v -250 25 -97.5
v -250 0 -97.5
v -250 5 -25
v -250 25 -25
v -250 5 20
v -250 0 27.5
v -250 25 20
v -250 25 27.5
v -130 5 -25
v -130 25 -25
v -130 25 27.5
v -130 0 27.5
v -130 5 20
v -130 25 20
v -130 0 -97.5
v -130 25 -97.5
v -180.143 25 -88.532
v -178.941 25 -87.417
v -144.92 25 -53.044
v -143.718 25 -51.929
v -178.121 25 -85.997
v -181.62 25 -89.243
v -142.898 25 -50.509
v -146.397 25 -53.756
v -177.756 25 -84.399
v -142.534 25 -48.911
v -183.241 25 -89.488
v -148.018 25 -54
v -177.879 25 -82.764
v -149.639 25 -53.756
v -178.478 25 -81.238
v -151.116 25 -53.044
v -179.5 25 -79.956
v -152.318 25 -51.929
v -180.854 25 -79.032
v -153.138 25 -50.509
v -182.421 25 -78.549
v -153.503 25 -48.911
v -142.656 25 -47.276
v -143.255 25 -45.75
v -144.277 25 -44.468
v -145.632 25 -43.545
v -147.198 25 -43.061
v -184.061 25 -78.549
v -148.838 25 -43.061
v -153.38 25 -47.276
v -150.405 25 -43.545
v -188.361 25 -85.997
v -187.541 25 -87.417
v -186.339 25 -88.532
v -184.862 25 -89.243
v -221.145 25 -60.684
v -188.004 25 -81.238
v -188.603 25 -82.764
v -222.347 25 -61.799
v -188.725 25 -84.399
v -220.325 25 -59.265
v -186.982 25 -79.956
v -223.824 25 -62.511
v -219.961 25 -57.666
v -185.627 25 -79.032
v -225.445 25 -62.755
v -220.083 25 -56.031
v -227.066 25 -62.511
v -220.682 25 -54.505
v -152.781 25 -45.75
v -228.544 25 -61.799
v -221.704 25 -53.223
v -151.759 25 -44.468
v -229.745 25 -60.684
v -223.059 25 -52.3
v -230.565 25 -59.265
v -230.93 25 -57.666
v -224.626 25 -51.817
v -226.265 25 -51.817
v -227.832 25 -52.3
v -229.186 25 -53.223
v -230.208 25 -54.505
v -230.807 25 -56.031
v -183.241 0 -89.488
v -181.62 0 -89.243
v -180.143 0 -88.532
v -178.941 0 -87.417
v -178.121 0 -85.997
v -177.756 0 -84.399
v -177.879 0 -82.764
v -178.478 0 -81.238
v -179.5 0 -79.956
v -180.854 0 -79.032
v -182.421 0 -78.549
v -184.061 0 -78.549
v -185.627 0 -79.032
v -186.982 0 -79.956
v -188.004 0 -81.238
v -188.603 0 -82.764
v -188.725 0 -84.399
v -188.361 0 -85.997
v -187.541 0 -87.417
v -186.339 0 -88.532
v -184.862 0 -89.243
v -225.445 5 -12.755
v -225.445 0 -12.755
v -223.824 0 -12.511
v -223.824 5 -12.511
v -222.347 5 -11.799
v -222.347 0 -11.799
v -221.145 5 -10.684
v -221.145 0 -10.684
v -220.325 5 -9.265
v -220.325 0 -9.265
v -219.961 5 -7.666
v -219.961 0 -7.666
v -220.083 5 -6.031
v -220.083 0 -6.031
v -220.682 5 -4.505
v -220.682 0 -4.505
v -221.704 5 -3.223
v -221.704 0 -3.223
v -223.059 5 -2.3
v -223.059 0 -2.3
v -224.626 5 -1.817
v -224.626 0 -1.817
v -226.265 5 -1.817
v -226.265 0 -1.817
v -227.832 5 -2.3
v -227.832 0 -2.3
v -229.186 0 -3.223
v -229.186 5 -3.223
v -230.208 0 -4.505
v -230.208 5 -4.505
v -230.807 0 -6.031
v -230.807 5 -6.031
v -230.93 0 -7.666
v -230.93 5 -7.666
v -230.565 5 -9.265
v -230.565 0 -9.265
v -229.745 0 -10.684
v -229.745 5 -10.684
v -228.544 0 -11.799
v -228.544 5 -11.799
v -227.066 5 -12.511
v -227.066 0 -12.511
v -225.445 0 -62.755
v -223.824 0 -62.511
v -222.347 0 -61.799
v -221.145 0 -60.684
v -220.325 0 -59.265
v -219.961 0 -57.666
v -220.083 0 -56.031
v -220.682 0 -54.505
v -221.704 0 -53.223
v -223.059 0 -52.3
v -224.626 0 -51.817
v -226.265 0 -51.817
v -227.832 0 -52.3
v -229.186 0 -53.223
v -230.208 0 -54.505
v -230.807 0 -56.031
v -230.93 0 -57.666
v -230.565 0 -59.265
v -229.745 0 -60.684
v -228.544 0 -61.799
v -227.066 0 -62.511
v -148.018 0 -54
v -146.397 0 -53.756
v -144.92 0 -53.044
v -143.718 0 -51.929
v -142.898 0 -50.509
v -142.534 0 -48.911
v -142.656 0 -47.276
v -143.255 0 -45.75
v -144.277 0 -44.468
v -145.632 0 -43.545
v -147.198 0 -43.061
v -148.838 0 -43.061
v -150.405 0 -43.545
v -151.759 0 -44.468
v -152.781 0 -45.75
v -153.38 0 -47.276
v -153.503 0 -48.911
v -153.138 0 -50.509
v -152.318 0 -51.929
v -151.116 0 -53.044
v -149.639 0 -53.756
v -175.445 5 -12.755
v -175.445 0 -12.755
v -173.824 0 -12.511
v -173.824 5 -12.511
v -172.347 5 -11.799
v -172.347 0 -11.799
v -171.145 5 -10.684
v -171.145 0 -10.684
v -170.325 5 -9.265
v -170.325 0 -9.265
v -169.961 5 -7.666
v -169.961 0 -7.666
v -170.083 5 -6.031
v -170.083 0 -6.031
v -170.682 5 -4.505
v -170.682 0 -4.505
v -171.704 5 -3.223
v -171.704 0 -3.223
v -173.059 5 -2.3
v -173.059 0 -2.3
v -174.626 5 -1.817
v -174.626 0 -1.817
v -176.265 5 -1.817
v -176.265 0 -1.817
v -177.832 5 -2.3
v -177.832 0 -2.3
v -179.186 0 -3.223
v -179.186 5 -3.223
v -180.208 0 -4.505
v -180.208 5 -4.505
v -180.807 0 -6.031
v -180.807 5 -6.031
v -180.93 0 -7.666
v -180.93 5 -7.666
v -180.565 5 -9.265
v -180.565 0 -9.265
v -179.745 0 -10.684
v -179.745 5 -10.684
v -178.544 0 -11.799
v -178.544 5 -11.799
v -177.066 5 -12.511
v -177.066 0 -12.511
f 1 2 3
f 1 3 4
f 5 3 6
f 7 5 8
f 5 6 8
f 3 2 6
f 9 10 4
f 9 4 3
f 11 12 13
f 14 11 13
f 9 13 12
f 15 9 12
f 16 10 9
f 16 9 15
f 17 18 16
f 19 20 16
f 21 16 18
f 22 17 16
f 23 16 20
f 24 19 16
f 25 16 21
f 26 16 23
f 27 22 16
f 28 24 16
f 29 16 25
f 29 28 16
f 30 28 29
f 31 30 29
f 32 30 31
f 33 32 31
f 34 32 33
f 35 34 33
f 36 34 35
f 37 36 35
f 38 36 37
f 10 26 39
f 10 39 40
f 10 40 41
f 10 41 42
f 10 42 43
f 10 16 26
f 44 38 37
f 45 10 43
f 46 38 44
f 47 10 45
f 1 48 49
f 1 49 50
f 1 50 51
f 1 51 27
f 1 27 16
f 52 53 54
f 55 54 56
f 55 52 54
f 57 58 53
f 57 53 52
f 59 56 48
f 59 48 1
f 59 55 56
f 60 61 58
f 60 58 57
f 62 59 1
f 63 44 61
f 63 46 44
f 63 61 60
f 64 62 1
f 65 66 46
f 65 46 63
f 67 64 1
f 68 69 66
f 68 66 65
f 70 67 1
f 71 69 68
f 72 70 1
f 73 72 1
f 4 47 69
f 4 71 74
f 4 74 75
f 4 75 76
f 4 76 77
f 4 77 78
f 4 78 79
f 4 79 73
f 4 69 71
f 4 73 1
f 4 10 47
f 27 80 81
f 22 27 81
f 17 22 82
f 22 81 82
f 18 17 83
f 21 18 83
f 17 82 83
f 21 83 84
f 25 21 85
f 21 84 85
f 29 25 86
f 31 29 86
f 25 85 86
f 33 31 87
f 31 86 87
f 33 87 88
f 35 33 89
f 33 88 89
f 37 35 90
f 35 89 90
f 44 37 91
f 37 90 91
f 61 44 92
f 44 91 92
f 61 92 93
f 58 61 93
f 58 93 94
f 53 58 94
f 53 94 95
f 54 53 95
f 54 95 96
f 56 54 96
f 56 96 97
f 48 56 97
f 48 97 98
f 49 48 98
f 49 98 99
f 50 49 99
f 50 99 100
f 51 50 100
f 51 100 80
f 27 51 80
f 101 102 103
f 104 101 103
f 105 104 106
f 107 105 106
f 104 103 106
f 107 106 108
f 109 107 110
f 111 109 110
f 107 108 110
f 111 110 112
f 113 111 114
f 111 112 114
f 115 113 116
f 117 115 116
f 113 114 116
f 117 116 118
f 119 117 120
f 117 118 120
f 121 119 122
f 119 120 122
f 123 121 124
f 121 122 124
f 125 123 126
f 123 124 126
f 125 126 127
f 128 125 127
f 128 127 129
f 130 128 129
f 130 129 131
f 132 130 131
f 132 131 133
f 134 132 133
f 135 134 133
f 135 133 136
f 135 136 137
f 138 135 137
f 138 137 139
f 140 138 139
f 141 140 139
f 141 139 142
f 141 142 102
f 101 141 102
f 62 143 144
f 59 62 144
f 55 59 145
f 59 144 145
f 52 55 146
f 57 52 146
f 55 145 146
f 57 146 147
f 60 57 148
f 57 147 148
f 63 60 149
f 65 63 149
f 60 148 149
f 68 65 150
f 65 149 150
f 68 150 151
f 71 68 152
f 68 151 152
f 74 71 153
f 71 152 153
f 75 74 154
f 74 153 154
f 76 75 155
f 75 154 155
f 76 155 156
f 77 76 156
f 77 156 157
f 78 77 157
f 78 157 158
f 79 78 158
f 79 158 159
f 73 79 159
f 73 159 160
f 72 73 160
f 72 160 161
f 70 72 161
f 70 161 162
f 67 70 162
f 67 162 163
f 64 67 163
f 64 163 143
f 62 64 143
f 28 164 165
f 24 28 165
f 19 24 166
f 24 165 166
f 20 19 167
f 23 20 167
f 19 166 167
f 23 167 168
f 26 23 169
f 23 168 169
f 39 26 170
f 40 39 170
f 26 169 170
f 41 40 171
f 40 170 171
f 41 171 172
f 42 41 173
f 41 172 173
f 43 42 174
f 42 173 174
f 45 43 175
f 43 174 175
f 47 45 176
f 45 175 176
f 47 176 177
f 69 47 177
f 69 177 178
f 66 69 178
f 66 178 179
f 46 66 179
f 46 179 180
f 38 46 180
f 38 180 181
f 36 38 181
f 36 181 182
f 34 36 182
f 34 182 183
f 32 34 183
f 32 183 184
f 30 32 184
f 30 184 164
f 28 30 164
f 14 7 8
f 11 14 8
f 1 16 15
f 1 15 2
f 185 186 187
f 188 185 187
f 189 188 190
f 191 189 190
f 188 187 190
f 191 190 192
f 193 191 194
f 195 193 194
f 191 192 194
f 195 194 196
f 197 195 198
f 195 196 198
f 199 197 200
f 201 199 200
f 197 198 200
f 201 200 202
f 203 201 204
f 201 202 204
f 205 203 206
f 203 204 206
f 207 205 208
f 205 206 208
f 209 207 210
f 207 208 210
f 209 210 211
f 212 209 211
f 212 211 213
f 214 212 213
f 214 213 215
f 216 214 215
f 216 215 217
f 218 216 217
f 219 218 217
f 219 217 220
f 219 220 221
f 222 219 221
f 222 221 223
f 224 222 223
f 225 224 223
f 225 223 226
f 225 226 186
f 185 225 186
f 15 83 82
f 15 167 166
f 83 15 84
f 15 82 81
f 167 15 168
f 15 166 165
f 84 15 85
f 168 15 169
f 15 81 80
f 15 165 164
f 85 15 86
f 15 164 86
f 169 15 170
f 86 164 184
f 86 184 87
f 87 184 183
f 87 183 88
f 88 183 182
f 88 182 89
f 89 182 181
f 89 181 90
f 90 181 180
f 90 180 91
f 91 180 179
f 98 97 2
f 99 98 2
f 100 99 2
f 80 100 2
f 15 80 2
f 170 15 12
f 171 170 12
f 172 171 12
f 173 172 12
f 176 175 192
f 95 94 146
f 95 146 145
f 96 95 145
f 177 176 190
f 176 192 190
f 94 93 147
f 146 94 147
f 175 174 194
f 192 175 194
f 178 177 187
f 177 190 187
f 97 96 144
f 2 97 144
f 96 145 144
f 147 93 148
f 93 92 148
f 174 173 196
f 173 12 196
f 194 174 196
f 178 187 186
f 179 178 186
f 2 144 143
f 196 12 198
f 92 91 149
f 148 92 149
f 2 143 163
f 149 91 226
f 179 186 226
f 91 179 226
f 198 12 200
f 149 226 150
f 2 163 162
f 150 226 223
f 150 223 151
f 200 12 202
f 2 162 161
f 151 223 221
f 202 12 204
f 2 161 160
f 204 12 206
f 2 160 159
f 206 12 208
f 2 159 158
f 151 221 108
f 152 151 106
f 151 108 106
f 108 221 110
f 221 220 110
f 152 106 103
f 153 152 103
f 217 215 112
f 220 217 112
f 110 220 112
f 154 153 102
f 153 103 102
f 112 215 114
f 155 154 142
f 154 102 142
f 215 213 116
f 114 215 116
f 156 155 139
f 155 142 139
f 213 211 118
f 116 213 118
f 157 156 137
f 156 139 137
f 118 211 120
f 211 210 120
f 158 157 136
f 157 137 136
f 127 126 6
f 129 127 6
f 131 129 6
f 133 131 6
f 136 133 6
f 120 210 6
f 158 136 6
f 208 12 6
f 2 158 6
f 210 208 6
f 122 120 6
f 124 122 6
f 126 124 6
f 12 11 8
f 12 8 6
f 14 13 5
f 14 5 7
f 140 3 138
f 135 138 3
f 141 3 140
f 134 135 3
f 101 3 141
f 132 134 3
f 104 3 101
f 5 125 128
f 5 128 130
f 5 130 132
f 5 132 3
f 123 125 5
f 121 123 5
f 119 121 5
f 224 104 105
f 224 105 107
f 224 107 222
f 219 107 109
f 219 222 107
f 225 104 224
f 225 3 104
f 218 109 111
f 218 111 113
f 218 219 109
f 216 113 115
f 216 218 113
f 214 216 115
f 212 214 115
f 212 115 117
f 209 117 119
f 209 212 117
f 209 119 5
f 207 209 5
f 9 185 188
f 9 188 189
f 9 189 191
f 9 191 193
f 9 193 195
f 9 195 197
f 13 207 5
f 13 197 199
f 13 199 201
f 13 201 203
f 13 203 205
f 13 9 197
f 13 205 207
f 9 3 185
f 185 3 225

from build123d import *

# Parameters (mm, degrees)
SKETCH1_W           = 120
SKETCH1_H           = 55
BOSS_EXTRUDE1_DEPTH = 5
SKETCH2_W           = 120
SKETCH2_H           = 7.5
BOSS_EXTRUDE2_DEPTH = 20
SKETCH3_W           = 120
SKETCH3_H           = 2.5
BOSS_EXTRUDE4_DEPTH = 20
BOSS_EXTRUDE5_DEPTH = 190
SKETCH9_W           = 310
SKETCH9_H           = 25
BOSS_EXTRUDE6_DEPTH = 70
SKETCH14_R          = 5.5
CUT_EXTRUDE5_DEPTH  = 153
SKETCH15_W          = 125
SKETCH15_H          = 25
CUT_EXTRUDE6_DEPTH  = 190


with BuildPart() as part:
    # Sketch1 → Boss-Extrude1 (new body)
    with BuildSketch(Plane(origin=(0, 0, 0), x_dir=(1, 0, 0), z_dir=(0, 1, 0))):
        Rectangle(SKETCH1_W, SKETCH1_H)
    extrude(amount=BOSS_EXTRUDE1_DEPTH)

    # Sketch2 → Boss-Extrude2 (add)
    with BuildSketch(Plane(origin=(0, 5, 0), x_dir=(1, 0, 0), z_dir=(0, 1, 0))):
        with Locations((0, -23.75)):
            Rectangle(SKETCH2_W, SKETCH2_H)
    extrude(amount=BOSS_EXTRUDE2_DEPTH)

    # Sketch3 → Boss-Extrude4 (add)
    with BuildSketch(Plane(origin=(0, 5, 0), x_dir=(1, 0, 0), z_dir=(0, 1, 0))):
        with Locations((0, 26.25)):
            Rectangle(SKETCH3_W, SKETCH3_H)
    extrude(amount=BOSS_EXTRUDE4_DEPTH)

    # Sketch8 → Boss-Extrude5 (add)
    with BuildSketch(Plane.ZY.offset(60)):
        Polygon((-27.5, 0), (-27.5, 25), (-25, 25), (-25, 5), (20, 5), (20, 25), (27.5, 25), (27.5, 0), align=None)
    extrude(amount=BOSS_EXTRUDE5_DEPTH)

    # Sketch9 → Boss-Extrude6 (add)
    with BuildSketch(Plane(origin=(0, 0, -27.5), x_dir=(-1, 0, 0), z_dir=(0, 0, -1))):
        with Locations((95, 12.5)):
            Rectangle(SKETCH9_W, SKETCH9_H)
    extrude(amount=BOSS_EXTRUDE6_DEPTH)

    # Sketch14 → Cut-Extrude5 (cut)
    with BuildSketch(Plane(origin=(0, 0, 0), x_dir=(-1, 0, 0), z_dir=(0, -1, 0))):
        with Locations(Location((225.445279058, 7.255161462, 0), (0, 0, 90))):
            Circle(SKETCH14_R)
        with Locations(Location((175.445279058, 7.255161462, 0), (0, 0, 90))):
            Circle(SKETCH14_R)
        with Locations(Location((225.445279058, 57.255161462, 0), (0, 0, 90))):
            Circle(SKETCH14_R)
        with Locations(Location((148.0182107, 48.5, 0), (0, 0, 90))):
            Circle(SKETCH14_R)
        with Locations(Location((183.240850763, 83.987541856, 0), (0, 0, 90))):
            Circle(SKETCH14_R)
    extrude(amount=-CUT_EXTRUDE5_DEPTH, mode=Mode.SUBTRACT)

    # Sketch15 → Cut-Extrude6 (cut)
    with BuildSketch(Plane(origin=(60, 0, 0), x_dir=(0, 0, -1), z_dir=(1, 0, 0))):
        with Locations((35, 12.5)):
            Rectangle(SKETCH15_W, SKETCH15_H)
    extrude(amount=-CUT_EXTRUDE6_DEPTH, mode=Mode.SUBTRACT)


solid = part.part
